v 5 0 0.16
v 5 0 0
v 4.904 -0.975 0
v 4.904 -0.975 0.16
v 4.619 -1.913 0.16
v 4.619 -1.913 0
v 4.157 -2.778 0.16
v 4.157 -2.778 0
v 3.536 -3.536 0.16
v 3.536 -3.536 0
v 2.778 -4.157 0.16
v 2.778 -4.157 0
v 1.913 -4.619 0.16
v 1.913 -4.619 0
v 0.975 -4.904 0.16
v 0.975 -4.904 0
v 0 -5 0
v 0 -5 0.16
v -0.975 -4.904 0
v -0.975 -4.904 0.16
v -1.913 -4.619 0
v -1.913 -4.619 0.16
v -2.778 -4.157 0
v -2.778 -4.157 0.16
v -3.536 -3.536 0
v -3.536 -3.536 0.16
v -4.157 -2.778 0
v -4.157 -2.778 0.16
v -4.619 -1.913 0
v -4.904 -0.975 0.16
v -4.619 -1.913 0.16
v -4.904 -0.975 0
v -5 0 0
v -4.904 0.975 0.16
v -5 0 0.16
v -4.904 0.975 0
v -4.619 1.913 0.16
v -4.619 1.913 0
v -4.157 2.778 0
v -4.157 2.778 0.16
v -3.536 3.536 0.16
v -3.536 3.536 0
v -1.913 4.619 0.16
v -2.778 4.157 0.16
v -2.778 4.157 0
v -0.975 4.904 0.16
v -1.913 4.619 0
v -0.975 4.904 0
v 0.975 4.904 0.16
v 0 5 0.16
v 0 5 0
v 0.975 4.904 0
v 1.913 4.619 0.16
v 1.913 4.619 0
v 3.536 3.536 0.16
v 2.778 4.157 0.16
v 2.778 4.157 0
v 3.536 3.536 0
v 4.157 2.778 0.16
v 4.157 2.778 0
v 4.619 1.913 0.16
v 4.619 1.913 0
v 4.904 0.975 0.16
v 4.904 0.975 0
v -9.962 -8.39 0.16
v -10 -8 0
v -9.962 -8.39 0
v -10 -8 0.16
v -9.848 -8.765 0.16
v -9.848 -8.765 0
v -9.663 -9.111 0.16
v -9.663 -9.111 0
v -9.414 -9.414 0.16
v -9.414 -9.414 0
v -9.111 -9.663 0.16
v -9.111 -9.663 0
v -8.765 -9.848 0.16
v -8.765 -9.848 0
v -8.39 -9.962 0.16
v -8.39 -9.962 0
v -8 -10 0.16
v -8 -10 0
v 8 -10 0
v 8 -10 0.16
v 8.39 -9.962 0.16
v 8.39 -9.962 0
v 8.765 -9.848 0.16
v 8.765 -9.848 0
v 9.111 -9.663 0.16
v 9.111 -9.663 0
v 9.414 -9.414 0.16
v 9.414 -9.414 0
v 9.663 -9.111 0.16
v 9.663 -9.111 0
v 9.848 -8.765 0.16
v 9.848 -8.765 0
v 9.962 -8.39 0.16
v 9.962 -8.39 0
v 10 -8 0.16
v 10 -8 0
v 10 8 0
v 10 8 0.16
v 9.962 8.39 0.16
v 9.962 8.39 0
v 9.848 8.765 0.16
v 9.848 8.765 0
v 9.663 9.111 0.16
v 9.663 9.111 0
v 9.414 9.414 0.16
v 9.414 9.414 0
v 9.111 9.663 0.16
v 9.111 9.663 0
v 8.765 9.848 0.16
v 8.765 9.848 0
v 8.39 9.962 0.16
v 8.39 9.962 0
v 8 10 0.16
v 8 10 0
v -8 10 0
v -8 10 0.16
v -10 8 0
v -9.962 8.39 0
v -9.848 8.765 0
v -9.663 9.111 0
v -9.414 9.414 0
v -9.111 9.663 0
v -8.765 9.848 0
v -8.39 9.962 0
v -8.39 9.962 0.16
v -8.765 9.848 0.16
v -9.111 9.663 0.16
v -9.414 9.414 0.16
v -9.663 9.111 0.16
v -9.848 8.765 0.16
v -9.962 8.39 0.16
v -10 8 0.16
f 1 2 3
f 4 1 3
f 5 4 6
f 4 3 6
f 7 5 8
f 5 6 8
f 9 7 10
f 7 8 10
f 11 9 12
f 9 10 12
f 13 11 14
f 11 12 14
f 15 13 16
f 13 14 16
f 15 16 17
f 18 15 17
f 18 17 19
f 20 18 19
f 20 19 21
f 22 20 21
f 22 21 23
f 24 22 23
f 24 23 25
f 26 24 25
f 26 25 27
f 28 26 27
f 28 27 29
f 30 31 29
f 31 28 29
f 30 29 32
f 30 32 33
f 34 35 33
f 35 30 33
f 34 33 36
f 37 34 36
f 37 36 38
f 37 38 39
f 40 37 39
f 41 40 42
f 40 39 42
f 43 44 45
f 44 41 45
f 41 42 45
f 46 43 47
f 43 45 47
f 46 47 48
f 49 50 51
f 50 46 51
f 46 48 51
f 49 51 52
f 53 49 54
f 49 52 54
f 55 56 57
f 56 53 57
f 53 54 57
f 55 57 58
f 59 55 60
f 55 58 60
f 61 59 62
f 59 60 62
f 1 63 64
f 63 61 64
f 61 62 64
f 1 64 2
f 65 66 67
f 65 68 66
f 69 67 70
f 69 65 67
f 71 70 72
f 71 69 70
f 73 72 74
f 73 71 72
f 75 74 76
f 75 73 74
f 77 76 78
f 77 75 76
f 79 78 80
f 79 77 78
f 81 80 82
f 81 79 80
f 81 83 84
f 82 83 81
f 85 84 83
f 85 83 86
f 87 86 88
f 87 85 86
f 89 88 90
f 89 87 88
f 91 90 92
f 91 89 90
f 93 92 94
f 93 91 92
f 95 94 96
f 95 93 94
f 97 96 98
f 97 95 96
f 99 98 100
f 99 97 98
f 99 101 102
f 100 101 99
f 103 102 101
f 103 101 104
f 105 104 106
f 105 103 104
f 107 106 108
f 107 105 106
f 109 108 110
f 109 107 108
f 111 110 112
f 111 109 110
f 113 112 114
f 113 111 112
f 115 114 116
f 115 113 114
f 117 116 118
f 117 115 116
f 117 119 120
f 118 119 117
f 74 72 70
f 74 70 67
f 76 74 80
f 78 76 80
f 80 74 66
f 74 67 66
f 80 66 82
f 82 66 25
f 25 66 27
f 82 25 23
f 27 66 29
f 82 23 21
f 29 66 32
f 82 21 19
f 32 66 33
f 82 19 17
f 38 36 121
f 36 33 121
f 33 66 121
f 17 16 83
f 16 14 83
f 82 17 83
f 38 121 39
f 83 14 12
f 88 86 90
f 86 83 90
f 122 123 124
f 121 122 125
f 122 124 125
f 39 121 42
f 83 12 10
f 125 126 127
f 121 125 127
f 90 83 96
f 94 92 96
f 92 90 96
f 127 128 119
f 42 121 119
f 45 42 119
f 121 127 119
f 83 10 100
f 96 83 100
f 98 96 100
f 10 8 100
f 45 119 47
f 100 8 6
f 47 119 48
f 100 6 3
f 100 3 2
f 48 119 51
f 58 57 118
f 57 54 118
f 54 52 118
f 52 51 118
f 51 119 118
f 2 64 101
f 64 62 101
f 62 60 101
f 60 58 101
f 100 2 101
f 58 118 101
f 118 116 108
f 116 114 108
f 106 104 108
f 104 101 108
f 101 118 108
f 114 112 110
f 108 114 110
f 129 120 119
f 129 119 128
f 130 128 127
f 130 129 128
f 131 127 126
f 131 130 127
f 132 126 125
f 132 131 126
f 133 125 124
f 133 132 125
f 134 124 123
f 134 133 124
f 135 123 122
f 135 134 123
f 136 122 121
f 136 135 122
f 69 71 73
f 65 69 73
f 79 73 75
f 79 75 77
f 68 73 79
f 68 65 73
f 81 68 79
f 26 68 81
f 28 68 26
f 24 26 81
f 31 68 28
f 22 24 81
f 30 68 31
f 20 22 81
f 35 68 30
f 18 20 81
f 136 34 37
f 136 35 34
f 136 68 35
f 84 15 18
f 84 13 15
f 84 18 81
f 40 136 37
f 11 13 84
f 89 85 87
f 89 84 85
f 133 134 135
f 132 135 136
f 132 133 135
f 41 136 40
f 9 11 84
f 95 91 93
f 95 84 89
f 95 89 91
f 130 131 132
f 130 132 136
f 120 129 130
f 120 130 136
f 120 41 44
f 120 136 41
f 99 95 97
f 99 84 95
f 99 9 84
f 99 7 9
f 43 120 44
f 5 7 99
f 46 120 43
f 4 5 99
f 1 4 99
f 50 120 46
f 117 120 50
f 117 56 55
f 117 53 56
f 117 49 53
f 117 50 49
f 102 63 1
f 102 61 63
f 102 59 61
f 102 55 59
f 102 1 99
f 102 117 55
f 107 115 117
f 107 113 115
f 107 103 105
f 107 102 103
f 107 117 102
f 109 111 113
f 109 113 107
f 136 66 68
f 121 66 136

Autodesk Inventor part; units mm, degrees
ref_plane "YZ Plane" through (0, 0, 0) normal (1, 0, 0) x (0, 1, 0)
ref_plane "XZ Plane" through (0, 0, 0) normal (0, 1, 0) x (-1, 0, 0)
ref_plane "XY Plane" through (0, 0, 0) normal (0, 0, 1) x (1, 0, 0)
sketch "スケッチ1" plane through (0, 0, 0) normal (0, 0, 1) x (1, 0, 0)
  line L0 (-10, 10) -> (10, 10)
  line L1 (10, 10) -> (10, -10)
  line L2 (10, -10) -> (-10, -10)
  line L3 (-10, -10) -> (-10, 10)
  point P0 (0, 0)
  dimension "d0" = 10
  dimension "d1" = 20
  dimension "d2" = 10
  dimension "d3" = 20
extrude "押し出し1" add sketch "スケッチ1" along normal blind 0.16
sketch "スケッチ2" plane through (0, 0, 0) normal (0, 0, 1) x (1, 0, 0)
  circle A0 centre (0, 0) radius 5
  dimension "d6" = 10
extrude "押し出し2" cut sketch "スケッチ2" along normal blind 0.16
fillet "フィレット1" radius 2 4 edges at (10, 10, 0.08) (-10, 10, 0.08) (10, -10, 0.08) (-10, -10, 0.08)
properties part number "HbSensorTape01"
